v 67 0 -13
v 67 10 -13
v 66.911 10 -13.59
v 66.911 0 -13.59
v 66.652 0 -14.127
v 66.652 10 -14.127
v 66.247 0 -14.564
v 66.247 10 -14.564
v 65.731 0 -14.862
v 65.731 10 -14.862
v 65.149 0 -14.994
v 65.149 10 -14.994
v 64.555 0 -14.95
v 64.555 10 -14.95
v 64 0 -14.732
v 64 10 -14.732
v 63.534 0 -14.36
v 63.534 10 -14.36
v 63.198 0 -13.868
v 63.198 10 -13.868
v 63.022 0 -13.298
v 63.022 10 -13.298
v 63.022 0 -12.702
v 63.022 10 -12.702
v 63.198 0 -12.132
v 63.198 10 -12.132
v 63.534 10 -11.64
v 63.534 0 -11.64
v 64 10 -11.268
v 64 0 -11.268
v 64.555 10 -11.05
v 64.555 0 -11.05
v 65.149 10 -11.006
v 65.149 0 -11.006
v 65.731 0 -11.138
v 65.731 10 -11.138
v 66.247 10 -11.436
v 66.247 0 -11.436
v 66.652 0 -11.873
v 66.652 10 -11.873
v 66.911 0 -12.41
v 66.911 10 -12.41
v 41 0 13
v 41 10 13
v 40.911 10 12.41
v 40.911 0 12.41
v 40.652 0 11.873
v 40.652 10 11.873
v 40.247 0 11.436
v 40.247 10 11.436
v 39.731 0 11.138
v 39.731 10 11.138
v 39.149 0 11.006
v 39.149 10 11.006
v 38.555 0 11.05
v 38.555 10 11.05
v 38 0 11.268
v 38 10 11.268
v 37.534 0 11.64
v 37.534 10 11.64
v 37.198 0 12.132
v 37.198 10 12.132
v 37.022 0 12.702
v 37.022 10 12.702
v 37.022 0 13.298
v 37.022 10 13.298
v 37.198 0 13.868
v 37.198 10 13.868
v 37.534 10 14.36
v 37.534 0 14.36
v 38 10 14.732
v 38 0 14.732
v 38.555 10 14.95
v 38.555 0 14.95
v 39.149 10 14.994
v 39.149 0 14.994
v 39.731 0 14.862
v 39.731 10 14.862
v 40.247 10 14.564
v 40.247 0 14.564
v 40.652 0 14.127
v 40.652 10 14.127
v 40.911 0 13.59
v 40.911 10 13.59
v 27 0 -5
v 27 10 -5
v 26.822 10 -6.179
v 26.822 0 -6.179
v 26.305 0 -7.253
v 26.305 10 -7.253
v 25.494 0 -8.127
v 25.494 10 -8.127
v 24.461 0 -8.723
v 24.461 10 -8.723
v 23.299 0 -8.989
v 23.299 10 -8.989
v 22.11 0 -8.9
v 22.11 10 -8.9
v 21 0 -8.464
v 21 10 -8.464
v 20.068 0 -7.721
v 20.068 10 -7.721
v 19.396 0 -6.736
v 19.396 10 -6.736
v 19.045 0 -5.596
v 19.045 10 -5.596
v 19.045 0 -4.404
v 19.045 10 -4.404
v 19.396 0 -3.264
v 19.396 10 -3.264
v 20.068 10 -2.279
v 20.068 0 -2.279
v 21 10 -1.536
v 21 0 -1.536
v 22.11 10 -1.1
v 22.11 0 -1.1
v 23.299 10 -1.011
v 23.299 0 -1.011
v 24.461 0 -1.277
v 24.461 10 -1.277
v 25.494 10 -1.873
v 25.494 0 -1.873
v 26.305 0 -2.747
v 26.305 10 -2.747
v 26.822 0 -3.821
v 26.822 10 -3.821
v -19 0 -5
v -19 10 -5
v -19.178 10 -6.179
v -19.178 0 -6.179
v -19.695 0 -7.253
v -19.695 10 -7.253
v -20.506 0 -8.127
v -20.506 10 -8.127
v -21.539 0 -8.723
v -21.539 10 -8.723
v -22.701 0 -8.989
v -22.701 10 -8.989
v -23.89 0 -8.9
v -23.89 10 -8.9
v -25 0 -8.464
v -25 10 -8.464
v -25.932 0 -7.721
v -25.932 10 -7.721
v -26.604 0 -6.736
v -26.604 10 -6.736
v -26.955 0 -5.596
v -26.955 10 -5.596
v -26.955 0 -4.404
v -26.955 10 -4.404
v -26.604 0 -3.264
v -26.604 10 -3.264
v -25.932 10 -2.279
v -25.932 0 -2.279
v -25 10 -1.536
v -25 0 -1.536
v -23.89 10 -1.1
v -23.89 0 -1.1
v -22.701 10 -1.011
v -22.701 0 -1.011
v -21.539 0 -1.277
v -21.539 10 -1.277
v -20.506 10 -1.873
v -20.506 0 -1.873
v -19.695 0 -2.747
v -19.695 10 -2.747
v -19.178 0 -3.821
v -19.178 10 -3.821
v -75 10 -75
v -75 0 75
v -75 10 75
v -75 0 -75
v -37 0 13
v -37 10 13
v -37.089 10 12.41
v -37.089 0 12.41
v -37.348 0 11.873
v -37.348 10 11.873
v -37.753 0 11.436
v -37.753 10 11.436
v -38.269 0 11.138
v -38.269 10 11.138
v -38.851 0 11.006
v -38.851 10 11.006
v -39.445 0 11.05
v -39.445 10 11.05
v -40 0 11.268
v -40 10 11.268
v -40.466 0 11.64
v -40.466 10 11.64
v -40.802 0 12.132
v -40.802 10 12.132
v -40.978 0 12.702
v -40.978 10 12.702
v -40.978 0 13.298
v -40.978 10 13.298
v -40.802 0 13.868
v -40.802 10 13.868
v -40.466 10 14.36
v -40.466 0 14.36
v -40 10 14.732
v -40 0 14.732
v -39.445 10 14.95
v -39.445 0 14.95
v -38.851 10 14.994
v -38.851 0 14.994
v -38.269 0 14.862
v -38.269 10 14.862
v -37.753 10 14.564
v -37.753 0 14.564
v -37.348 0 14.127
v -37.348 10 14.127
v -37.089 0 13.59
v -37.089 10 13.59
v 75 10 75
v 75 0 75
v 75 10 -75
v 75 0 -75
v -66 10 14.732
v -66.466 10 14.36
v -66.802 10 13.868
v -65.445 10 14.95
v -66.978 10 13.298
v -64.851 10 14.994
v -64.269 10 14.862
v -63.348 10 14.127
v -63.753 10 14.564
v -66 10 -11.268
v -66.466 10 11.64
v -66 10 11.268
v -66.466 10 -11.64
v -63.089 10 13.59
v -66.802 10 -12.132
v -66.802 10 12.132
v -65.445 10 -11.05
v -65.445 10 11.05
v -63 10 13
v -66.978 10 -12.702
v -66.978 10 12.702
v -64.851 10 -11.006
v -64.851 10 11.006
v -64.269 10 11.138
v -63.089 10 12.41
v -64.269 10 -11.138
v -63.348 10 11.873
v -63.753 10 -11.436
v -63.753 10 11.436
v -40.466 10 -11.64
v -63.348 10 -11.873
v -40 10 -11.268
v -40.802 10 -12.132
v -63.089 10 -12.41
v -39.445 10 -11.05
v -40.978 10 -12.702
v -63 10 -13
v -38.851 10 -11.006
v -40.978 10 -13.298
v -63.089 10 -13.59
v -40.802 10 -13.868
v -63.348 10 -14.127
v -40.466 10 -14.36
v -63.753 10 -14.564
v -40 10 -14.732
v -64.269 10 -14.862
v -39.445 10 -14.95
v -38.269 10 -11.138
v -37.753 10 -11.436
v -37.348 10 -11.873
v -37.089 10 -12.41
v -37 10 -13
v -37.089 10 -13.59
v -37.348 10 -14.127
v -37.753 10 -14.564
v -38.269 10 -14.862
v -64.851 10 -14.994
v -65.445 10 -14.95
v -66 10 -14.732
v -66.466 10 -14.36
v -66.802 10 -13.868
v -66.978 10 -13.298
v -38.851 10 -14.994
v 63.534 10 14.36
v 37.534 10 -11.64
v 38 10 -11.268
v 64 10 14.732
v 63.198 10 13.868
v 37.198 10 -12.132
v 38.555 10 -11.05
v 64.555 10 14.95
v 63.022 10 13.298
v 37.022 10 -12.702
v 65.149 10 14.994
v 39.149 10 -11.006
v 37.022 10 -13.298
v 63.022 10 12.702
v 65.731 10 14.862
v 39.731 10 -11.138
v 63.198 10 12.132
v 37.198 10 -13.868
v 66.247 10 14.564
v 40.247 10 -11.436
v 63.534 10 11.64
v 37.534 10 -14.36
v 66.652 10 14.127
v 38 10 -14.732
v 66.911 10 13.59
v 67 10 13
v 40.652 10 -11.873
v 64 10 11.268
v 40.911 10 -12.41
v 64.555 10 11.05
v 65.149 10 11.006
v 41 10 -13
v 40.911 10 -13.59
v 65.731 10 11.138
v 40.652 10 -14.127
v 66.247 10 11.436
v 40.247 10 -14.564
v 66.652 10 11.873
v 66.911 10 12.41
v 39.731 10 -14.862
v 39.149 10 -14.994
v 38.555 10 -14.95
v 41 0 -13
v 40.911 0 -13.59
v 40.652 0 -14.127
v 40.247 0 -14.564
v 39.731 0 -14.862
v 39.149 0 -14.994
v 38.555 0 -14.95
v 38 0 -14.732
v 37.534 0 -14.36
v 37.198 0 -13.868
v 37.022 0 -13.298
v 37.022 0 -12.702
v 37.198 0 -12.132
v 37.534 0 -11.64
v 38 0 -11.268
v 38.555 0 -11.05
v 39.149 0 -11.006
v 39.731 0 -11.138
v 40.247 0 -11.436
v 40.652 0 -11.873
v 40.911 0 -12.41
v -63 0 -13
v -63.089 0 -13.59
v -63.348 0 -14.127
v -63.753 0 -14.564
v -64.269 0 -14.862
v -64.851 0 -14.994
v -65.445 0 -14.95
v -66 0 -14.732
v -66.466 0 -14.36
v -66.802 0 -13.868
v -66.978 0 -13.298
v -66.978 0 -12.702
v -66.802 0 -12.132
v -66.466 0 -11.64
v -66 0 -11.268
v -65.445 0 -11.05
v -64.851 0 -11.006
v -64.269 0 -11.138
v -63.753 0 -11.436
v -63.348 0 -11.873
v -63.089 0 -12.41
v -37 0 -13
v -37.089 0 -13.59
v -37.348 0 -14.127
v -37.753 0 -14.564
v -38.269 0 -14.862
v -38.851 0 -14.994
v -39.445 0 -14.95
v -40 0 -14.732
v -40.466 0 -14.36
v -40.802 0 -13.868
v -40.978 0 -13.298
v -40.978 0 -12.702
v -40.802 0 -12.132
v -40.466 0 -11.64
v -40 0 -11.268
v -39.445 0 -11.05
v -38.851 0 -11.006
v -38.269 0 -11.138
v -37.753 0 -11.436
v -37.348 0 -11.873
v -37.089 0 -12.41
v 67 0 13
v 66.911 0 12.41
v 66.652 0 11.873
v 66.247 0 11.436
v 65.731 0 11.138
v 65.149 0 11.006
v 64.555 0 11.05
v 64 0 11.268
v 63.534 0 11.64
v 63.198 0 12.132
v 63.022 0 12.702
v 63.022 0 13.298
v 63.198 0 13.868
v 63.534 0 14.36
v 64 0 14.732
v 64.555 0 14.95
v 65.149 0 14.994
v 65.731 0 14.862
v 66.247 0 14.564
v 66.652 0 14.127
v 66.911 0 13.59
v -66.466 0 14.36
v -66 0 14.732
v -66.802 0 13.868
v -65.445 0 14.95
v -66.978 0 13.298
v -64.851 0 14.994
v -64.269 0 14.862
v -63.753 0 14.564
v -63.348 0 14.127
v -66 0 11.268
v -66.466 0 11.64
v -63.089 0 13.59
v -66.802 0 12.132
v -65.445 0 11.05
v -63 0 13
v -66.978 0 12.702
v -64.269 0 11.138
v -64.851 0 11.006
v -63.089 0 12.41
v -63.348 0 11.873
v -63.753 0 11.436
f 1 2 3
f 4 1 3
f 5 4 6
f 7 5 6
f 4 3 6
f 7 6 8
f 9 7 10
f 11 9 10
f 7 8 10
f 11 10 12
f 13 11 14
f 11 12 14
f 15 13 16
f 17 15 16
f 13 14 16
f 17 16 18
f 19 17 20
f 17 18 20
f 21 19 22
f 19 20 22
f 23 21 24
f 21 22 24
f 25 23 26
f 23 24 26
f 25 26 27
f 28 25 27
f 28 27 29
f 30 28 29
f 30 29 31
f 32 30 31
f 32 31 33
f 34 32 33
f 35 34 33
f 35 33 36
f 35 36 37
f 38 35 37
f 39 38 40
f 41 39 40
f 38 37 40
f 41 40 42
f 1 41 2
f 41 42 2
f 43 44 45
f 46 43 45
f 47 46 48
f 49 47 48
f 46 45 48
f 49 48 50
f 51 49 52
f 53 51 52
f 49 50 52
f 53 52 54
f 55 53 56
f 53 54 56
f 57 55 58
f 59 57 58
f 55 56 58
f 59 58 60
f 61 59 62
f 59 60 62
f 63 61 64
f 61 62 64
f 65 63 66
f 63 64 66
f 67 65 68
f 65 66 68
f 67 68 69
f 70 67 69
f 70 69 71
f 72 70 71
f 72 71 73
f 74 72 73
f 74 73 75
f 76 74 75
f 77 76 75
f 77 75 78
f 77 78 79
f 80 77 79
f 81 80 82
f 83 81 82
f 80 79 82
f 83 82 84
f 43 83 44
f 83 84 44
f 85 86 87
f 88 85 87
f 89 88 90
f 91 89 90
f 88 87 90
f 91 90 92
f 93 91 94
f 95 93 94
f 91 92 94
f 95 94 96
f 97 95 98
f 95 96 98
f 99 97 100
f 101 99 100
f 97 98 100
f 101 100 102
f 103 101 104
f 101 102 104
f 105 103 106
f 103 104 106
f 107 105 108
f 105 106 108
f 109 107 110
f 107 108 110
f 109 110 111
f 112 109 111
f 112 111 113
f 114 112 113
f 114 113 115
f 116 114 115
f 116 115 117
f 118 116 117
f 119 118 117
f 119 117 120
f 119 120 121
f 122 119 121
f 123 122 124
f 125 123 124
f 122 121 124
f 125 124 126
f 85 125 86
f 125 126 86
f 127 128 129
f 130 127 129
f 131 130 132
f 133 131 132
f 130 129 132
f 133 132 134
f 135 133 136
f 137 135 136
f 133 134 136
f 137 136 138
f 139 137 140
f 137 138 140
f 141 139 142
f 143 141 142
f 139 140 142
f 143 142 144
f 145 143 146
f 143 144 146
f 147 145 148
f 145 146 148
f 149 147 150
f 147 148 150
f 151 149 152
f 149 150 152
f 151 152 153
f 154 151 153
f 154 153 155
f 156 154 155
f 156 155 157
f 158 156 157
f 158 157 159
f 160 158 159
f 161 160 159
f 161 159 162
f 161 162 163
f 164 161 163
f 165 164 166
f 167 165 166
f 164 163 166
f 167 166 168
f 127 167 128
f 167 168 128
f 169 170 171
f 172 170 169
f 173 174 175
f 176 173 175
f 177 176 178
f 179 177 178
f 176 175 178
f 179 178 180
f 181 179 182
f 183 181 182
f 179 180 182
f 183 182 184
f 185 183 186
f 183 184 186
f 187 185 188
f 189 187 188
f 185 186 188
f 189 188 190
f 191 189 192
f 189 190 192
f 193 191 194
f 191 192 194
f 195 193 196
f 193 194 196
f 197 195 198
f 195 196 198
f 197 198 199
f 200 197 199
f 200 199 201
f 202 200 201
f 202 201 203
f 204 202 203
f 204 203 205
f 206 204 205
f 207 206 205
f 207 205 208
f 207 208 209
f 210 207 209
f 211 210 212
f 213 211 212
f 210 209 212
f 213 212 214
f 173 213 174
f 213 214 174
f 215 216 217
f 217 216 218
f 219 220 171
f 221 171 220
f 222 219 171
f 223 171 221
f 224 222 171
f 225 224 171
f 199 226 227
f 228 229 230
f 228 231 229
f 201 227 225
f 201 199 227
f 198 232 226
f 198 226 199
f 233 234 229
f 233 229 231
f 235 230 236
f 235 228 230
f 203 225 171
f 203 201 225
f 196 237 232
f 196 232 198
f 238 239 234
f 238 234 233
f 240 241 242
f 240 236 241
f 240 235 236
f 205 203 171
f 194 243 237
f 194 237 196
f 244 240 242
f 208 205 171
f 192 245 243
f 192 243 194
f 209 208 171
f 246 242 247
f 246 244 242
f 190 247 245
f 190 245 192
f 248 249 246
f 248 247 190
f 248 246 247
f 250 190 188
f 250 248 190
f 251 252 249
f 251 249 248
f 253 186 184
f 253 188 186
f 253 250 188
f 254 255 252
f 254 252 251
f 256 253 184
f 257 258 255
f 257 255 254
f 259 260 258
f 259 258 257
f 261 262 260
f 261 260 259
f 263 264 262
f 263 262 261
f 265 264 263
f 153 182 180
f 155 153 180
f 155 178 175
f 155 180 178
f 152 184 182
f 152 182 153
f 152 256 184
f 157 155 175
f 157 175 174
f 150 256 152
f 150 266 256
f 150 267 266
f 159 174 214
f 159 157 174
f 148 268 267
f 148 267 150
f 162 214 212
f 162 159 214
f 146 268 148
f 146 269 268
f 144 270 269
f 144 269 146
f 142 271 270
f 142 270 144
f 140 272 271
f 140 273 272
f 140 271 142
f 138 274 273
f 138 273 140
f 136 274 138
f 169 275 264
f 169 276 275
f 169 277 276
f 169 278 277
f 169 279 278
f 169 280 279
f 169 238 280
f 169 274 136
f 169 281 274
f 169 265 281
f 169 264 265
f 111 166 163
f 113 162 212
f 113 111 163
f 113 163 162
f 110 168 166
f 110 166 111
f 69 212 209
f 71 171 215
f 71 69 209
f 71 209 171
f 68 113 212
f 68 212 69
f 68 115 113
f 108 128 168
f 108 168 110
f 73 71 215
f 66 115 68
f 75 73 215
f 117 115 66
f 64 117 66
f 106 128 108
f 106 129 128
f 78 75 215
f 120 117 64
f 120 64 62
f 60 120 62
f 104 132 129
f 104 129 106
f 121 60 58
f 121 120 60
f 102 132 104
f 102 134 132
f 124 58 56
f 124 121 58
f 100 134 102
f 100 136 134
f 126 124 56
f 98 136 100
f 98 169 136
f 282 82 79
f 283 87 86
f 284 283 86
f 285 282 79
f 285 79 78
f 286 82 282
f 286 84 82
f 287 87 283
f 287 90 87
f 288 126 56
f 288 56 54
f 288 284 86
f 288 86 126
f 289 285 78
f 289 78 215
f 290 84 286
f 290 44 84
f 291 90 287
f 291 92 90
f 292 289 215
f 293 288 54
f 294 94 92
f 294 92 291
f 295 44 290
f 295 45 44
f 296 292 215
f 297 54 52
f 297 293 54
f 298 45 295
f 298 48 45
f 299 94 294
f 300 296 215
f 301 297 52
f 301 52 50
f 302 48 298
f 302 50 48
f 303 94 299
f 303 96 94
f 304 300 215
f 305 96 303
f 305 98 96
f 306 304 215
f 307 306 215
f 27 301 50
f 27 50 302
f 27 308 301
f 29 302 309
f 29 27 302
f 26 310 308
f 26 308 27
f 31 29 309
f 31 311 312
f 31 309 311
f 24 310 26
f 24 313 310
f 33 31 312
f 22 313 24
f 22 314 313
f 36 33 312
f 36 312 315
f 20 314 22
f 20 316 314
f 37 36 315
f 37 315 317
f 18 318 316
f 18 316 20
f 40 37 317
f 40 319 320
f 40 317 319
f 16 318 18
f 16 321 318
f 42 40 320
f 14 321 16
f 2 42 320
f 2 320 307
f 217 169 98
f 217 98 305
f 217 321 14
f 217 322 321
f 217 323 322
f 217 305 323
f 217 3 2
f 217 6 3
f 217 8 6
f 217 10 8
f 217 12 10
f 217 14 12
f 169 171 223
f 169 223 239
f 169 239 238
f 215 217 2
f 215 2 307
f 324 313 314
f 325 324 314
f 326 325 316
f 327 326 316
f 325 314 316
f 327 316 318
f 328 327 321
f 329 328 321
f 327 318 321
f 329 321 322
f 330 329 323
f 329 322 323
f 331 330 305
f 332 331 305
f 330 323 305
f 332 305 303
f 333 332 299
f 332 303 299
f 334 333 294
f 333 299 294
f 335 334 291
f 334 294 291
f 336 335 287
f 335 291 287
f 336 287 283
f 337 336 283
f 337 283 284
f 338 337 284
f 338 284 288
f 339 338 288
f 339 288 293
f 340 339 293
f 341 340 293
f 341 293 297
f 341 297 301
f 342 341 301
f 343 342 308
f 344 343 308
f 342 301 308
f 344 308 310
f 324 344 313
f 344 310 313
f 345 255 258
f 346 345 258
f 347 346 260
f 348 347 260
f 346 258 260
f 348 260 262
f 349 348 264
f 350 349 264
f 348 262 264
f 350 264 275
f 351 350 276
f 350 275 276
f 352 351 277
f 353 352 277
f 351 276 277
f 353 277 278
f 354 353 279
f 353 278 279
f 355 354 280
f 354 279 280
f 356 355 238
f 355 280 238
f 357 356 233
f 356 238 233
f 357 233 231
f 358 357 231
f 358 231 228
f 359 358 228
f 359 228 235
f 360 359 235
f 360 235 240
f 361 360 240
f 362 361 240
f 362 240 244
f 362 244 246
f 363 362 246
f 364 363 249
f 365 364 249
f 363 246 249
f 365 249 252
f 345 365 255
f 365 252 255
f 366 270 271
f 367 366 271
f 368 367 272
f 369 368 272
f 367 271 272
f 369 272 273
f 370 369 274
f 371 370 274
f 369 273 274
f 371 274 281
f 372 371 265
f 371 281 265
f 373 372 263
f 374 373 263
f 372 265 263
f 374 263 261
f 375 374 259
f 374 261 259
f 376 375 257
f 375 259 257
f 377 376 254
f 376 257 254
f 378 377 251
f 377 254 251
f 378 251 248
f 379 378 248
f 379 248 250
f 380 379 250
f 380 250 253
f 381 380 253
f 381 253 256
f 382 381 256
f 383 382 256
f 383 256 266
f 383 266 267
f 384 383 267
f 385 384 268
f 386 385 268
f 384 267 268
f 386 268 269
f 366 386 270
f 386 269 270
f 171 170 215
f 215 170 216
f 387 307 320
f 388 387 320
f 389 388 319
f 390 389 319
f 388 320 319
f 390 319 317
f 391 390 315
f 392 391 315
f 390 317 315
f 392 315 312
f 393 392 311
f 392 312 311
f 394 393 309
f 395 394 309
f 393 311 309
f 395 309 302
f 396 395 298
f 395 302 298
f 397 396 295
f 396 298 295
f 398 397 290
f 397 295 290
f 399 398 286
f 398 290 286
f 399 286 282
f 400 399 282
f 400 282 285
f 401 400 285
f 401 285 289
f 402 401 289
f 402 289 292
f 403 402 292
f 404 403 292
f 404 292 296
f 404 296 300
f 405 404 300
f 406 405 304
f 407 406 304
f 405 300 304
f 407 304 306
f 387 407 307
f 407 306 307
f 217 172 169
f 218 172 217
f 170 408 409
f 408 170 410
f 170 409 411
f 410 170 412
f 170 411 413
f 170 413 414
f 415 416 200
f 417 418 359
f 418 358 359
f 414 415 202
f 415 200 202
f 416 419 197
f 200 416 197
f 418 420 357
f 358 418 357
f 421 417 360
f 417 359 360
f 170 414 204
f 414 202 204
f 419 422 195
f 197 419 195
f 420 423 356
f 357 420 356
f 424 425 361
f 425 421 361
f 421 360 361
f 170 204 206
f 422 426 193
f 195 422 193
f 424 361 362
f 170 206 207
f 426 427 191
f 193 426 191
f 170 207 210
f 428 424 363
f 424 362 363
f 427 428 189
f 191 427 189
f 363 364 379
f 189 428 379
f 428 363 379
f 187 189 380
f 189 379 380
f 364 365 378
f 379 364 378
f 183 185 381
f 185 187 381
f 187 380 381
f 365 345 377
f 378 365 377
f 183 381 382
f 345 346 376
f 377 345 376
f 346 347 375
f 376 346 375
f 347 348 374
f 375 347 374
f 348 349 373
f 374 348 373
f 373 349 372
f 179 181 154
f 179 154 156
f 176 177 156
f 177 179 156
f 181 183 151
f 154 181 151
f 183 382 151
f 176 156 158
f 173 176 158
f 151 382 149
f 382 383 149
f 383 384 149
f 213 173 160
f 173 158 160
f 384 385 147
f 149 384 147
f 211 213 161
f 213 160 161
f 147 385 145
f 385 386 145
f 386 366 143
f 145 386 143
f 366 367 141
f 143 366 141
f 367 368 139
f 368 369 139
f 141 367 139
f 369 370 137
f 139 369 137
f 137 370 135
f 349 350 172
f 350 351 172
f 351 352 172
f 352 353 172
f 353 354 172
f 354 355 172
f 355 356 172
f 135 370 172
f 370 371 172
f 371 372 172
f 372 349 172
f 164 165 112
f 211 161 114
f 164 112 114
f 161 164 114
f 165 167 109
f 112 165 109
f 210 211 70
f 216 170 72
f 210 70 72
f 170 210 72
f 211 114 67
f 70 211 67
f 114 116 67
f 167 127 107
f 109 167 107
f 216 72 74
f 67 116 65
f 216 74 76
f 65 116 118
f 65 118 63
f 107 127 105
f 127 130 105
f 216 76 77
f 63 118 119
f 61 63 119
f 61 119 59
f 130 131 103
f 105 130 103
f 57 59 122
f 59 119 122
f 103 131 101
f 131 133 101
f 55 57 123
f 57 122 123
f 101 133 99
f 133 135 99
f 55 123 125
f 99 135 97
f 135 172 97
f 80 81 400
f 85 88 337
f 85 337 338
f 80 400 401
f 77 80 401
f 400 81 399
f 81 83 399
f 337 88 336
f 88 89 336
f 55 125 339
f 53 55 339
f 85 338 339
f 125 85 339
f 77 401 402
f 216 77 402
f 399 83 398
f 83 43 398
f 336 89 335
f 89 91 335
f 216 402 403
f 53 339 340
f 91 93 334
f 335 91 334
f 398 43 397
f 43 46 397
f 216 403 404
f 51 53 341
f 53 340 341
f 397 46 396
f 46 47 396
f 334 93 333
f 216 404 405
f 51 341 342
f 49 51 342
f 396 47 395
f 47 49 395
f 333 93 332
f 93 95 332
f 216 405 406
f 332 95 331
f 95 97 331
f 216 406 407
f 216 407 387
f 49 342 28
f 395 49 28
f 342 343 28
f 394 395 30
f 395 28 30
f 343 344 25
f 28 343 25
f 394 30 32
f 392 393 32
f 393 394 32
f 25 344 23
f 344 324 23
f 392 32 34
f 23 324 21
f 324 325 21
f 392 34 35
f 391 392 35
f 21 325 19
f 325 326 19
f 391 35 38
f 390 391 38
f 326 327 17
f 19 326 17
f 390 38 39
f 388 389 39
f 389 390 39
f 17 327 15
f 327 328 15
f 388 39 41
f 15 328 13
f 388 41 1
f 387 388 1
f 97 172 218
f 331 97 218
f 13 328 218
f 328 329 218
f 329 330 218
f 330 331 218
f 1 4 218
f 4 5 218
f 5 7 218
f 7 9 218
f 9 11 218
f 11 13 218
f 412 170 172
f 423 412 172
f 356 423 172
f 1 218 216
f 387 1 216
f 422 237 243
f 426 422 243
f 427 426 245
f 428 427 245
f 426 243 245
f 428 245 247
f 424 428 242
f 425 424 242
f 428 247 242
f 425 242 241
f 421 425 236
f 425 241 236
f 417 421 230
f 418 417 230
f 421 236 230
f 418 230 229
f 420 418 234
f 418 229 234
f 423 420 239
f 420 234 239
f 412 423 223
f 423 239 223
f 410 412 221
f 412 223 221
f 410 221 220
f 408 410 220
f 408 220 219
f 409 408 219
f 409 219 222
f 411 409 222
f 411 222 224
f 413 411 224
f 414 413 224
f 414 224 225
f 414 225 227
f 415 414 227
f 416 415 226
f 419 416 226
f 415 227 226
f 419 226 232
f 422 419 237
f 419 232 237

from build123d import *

# Parameters (mm, degrees)
SKETCH1_W           = 150
SKETCH1_H           = 150
BOSS_EXTRUDE1_DEPTH = 10
SKETCH2_R           = 4
SKETCH2_R_2         = 2
CUT_EXTRUDE1_DEPTH  = 10


with BuildPart() as part:
    # Sketch1 → Boss-Extrude1 (new body)
    with BuildSketch(Plane(origin=(0, 0, 0), x_dir=(1, 0, 0), z_dir=(0, 1, 0))):
        Rectangle(SKETCH1_W, SKETCH1_H)
    extrude(amount=BOSS_EXTRUDE1_DEPTH)

    # Sketch2 → Cut-Extrude1 (cut)
    with BuildSketch(Plane(origin=(0, 10, 0), x_dir=(1, 0, 0), z_dir=(0, 1, 0))):
        with Locations((23, 5)):
            Circle(SKETCH2_R)
        with Locations((-23, 5)):
            Circle(SKETCH2_R)
        with Locations((-65, 13)):
            Circle(SKETCH2_R_2)
        with Locations((-39, 13)):
            Circle(SKETCH2_R_2)
        with Locations((-65, -13)):
            Circle(SKETCH2_R_2)
        with Locations((-39, -13)):
            Circle(SKETCH2_R_2)
        with Locations((39, 13)):
            Circle(SKETCH2_R_2)
        with Locations((65, 13)):
            Circle(SKETCH2_R_2)
        with Locations((65, -13)):
            Circle(SKETCH2_R_2)
        with Locations((39, -13)):
            Circle(SKETCH2_R_2)
    extrude(amount=-CUT_EXTRUDE1_DEPTH, mode=Mode.SUBTRACT)


solid = part.part
